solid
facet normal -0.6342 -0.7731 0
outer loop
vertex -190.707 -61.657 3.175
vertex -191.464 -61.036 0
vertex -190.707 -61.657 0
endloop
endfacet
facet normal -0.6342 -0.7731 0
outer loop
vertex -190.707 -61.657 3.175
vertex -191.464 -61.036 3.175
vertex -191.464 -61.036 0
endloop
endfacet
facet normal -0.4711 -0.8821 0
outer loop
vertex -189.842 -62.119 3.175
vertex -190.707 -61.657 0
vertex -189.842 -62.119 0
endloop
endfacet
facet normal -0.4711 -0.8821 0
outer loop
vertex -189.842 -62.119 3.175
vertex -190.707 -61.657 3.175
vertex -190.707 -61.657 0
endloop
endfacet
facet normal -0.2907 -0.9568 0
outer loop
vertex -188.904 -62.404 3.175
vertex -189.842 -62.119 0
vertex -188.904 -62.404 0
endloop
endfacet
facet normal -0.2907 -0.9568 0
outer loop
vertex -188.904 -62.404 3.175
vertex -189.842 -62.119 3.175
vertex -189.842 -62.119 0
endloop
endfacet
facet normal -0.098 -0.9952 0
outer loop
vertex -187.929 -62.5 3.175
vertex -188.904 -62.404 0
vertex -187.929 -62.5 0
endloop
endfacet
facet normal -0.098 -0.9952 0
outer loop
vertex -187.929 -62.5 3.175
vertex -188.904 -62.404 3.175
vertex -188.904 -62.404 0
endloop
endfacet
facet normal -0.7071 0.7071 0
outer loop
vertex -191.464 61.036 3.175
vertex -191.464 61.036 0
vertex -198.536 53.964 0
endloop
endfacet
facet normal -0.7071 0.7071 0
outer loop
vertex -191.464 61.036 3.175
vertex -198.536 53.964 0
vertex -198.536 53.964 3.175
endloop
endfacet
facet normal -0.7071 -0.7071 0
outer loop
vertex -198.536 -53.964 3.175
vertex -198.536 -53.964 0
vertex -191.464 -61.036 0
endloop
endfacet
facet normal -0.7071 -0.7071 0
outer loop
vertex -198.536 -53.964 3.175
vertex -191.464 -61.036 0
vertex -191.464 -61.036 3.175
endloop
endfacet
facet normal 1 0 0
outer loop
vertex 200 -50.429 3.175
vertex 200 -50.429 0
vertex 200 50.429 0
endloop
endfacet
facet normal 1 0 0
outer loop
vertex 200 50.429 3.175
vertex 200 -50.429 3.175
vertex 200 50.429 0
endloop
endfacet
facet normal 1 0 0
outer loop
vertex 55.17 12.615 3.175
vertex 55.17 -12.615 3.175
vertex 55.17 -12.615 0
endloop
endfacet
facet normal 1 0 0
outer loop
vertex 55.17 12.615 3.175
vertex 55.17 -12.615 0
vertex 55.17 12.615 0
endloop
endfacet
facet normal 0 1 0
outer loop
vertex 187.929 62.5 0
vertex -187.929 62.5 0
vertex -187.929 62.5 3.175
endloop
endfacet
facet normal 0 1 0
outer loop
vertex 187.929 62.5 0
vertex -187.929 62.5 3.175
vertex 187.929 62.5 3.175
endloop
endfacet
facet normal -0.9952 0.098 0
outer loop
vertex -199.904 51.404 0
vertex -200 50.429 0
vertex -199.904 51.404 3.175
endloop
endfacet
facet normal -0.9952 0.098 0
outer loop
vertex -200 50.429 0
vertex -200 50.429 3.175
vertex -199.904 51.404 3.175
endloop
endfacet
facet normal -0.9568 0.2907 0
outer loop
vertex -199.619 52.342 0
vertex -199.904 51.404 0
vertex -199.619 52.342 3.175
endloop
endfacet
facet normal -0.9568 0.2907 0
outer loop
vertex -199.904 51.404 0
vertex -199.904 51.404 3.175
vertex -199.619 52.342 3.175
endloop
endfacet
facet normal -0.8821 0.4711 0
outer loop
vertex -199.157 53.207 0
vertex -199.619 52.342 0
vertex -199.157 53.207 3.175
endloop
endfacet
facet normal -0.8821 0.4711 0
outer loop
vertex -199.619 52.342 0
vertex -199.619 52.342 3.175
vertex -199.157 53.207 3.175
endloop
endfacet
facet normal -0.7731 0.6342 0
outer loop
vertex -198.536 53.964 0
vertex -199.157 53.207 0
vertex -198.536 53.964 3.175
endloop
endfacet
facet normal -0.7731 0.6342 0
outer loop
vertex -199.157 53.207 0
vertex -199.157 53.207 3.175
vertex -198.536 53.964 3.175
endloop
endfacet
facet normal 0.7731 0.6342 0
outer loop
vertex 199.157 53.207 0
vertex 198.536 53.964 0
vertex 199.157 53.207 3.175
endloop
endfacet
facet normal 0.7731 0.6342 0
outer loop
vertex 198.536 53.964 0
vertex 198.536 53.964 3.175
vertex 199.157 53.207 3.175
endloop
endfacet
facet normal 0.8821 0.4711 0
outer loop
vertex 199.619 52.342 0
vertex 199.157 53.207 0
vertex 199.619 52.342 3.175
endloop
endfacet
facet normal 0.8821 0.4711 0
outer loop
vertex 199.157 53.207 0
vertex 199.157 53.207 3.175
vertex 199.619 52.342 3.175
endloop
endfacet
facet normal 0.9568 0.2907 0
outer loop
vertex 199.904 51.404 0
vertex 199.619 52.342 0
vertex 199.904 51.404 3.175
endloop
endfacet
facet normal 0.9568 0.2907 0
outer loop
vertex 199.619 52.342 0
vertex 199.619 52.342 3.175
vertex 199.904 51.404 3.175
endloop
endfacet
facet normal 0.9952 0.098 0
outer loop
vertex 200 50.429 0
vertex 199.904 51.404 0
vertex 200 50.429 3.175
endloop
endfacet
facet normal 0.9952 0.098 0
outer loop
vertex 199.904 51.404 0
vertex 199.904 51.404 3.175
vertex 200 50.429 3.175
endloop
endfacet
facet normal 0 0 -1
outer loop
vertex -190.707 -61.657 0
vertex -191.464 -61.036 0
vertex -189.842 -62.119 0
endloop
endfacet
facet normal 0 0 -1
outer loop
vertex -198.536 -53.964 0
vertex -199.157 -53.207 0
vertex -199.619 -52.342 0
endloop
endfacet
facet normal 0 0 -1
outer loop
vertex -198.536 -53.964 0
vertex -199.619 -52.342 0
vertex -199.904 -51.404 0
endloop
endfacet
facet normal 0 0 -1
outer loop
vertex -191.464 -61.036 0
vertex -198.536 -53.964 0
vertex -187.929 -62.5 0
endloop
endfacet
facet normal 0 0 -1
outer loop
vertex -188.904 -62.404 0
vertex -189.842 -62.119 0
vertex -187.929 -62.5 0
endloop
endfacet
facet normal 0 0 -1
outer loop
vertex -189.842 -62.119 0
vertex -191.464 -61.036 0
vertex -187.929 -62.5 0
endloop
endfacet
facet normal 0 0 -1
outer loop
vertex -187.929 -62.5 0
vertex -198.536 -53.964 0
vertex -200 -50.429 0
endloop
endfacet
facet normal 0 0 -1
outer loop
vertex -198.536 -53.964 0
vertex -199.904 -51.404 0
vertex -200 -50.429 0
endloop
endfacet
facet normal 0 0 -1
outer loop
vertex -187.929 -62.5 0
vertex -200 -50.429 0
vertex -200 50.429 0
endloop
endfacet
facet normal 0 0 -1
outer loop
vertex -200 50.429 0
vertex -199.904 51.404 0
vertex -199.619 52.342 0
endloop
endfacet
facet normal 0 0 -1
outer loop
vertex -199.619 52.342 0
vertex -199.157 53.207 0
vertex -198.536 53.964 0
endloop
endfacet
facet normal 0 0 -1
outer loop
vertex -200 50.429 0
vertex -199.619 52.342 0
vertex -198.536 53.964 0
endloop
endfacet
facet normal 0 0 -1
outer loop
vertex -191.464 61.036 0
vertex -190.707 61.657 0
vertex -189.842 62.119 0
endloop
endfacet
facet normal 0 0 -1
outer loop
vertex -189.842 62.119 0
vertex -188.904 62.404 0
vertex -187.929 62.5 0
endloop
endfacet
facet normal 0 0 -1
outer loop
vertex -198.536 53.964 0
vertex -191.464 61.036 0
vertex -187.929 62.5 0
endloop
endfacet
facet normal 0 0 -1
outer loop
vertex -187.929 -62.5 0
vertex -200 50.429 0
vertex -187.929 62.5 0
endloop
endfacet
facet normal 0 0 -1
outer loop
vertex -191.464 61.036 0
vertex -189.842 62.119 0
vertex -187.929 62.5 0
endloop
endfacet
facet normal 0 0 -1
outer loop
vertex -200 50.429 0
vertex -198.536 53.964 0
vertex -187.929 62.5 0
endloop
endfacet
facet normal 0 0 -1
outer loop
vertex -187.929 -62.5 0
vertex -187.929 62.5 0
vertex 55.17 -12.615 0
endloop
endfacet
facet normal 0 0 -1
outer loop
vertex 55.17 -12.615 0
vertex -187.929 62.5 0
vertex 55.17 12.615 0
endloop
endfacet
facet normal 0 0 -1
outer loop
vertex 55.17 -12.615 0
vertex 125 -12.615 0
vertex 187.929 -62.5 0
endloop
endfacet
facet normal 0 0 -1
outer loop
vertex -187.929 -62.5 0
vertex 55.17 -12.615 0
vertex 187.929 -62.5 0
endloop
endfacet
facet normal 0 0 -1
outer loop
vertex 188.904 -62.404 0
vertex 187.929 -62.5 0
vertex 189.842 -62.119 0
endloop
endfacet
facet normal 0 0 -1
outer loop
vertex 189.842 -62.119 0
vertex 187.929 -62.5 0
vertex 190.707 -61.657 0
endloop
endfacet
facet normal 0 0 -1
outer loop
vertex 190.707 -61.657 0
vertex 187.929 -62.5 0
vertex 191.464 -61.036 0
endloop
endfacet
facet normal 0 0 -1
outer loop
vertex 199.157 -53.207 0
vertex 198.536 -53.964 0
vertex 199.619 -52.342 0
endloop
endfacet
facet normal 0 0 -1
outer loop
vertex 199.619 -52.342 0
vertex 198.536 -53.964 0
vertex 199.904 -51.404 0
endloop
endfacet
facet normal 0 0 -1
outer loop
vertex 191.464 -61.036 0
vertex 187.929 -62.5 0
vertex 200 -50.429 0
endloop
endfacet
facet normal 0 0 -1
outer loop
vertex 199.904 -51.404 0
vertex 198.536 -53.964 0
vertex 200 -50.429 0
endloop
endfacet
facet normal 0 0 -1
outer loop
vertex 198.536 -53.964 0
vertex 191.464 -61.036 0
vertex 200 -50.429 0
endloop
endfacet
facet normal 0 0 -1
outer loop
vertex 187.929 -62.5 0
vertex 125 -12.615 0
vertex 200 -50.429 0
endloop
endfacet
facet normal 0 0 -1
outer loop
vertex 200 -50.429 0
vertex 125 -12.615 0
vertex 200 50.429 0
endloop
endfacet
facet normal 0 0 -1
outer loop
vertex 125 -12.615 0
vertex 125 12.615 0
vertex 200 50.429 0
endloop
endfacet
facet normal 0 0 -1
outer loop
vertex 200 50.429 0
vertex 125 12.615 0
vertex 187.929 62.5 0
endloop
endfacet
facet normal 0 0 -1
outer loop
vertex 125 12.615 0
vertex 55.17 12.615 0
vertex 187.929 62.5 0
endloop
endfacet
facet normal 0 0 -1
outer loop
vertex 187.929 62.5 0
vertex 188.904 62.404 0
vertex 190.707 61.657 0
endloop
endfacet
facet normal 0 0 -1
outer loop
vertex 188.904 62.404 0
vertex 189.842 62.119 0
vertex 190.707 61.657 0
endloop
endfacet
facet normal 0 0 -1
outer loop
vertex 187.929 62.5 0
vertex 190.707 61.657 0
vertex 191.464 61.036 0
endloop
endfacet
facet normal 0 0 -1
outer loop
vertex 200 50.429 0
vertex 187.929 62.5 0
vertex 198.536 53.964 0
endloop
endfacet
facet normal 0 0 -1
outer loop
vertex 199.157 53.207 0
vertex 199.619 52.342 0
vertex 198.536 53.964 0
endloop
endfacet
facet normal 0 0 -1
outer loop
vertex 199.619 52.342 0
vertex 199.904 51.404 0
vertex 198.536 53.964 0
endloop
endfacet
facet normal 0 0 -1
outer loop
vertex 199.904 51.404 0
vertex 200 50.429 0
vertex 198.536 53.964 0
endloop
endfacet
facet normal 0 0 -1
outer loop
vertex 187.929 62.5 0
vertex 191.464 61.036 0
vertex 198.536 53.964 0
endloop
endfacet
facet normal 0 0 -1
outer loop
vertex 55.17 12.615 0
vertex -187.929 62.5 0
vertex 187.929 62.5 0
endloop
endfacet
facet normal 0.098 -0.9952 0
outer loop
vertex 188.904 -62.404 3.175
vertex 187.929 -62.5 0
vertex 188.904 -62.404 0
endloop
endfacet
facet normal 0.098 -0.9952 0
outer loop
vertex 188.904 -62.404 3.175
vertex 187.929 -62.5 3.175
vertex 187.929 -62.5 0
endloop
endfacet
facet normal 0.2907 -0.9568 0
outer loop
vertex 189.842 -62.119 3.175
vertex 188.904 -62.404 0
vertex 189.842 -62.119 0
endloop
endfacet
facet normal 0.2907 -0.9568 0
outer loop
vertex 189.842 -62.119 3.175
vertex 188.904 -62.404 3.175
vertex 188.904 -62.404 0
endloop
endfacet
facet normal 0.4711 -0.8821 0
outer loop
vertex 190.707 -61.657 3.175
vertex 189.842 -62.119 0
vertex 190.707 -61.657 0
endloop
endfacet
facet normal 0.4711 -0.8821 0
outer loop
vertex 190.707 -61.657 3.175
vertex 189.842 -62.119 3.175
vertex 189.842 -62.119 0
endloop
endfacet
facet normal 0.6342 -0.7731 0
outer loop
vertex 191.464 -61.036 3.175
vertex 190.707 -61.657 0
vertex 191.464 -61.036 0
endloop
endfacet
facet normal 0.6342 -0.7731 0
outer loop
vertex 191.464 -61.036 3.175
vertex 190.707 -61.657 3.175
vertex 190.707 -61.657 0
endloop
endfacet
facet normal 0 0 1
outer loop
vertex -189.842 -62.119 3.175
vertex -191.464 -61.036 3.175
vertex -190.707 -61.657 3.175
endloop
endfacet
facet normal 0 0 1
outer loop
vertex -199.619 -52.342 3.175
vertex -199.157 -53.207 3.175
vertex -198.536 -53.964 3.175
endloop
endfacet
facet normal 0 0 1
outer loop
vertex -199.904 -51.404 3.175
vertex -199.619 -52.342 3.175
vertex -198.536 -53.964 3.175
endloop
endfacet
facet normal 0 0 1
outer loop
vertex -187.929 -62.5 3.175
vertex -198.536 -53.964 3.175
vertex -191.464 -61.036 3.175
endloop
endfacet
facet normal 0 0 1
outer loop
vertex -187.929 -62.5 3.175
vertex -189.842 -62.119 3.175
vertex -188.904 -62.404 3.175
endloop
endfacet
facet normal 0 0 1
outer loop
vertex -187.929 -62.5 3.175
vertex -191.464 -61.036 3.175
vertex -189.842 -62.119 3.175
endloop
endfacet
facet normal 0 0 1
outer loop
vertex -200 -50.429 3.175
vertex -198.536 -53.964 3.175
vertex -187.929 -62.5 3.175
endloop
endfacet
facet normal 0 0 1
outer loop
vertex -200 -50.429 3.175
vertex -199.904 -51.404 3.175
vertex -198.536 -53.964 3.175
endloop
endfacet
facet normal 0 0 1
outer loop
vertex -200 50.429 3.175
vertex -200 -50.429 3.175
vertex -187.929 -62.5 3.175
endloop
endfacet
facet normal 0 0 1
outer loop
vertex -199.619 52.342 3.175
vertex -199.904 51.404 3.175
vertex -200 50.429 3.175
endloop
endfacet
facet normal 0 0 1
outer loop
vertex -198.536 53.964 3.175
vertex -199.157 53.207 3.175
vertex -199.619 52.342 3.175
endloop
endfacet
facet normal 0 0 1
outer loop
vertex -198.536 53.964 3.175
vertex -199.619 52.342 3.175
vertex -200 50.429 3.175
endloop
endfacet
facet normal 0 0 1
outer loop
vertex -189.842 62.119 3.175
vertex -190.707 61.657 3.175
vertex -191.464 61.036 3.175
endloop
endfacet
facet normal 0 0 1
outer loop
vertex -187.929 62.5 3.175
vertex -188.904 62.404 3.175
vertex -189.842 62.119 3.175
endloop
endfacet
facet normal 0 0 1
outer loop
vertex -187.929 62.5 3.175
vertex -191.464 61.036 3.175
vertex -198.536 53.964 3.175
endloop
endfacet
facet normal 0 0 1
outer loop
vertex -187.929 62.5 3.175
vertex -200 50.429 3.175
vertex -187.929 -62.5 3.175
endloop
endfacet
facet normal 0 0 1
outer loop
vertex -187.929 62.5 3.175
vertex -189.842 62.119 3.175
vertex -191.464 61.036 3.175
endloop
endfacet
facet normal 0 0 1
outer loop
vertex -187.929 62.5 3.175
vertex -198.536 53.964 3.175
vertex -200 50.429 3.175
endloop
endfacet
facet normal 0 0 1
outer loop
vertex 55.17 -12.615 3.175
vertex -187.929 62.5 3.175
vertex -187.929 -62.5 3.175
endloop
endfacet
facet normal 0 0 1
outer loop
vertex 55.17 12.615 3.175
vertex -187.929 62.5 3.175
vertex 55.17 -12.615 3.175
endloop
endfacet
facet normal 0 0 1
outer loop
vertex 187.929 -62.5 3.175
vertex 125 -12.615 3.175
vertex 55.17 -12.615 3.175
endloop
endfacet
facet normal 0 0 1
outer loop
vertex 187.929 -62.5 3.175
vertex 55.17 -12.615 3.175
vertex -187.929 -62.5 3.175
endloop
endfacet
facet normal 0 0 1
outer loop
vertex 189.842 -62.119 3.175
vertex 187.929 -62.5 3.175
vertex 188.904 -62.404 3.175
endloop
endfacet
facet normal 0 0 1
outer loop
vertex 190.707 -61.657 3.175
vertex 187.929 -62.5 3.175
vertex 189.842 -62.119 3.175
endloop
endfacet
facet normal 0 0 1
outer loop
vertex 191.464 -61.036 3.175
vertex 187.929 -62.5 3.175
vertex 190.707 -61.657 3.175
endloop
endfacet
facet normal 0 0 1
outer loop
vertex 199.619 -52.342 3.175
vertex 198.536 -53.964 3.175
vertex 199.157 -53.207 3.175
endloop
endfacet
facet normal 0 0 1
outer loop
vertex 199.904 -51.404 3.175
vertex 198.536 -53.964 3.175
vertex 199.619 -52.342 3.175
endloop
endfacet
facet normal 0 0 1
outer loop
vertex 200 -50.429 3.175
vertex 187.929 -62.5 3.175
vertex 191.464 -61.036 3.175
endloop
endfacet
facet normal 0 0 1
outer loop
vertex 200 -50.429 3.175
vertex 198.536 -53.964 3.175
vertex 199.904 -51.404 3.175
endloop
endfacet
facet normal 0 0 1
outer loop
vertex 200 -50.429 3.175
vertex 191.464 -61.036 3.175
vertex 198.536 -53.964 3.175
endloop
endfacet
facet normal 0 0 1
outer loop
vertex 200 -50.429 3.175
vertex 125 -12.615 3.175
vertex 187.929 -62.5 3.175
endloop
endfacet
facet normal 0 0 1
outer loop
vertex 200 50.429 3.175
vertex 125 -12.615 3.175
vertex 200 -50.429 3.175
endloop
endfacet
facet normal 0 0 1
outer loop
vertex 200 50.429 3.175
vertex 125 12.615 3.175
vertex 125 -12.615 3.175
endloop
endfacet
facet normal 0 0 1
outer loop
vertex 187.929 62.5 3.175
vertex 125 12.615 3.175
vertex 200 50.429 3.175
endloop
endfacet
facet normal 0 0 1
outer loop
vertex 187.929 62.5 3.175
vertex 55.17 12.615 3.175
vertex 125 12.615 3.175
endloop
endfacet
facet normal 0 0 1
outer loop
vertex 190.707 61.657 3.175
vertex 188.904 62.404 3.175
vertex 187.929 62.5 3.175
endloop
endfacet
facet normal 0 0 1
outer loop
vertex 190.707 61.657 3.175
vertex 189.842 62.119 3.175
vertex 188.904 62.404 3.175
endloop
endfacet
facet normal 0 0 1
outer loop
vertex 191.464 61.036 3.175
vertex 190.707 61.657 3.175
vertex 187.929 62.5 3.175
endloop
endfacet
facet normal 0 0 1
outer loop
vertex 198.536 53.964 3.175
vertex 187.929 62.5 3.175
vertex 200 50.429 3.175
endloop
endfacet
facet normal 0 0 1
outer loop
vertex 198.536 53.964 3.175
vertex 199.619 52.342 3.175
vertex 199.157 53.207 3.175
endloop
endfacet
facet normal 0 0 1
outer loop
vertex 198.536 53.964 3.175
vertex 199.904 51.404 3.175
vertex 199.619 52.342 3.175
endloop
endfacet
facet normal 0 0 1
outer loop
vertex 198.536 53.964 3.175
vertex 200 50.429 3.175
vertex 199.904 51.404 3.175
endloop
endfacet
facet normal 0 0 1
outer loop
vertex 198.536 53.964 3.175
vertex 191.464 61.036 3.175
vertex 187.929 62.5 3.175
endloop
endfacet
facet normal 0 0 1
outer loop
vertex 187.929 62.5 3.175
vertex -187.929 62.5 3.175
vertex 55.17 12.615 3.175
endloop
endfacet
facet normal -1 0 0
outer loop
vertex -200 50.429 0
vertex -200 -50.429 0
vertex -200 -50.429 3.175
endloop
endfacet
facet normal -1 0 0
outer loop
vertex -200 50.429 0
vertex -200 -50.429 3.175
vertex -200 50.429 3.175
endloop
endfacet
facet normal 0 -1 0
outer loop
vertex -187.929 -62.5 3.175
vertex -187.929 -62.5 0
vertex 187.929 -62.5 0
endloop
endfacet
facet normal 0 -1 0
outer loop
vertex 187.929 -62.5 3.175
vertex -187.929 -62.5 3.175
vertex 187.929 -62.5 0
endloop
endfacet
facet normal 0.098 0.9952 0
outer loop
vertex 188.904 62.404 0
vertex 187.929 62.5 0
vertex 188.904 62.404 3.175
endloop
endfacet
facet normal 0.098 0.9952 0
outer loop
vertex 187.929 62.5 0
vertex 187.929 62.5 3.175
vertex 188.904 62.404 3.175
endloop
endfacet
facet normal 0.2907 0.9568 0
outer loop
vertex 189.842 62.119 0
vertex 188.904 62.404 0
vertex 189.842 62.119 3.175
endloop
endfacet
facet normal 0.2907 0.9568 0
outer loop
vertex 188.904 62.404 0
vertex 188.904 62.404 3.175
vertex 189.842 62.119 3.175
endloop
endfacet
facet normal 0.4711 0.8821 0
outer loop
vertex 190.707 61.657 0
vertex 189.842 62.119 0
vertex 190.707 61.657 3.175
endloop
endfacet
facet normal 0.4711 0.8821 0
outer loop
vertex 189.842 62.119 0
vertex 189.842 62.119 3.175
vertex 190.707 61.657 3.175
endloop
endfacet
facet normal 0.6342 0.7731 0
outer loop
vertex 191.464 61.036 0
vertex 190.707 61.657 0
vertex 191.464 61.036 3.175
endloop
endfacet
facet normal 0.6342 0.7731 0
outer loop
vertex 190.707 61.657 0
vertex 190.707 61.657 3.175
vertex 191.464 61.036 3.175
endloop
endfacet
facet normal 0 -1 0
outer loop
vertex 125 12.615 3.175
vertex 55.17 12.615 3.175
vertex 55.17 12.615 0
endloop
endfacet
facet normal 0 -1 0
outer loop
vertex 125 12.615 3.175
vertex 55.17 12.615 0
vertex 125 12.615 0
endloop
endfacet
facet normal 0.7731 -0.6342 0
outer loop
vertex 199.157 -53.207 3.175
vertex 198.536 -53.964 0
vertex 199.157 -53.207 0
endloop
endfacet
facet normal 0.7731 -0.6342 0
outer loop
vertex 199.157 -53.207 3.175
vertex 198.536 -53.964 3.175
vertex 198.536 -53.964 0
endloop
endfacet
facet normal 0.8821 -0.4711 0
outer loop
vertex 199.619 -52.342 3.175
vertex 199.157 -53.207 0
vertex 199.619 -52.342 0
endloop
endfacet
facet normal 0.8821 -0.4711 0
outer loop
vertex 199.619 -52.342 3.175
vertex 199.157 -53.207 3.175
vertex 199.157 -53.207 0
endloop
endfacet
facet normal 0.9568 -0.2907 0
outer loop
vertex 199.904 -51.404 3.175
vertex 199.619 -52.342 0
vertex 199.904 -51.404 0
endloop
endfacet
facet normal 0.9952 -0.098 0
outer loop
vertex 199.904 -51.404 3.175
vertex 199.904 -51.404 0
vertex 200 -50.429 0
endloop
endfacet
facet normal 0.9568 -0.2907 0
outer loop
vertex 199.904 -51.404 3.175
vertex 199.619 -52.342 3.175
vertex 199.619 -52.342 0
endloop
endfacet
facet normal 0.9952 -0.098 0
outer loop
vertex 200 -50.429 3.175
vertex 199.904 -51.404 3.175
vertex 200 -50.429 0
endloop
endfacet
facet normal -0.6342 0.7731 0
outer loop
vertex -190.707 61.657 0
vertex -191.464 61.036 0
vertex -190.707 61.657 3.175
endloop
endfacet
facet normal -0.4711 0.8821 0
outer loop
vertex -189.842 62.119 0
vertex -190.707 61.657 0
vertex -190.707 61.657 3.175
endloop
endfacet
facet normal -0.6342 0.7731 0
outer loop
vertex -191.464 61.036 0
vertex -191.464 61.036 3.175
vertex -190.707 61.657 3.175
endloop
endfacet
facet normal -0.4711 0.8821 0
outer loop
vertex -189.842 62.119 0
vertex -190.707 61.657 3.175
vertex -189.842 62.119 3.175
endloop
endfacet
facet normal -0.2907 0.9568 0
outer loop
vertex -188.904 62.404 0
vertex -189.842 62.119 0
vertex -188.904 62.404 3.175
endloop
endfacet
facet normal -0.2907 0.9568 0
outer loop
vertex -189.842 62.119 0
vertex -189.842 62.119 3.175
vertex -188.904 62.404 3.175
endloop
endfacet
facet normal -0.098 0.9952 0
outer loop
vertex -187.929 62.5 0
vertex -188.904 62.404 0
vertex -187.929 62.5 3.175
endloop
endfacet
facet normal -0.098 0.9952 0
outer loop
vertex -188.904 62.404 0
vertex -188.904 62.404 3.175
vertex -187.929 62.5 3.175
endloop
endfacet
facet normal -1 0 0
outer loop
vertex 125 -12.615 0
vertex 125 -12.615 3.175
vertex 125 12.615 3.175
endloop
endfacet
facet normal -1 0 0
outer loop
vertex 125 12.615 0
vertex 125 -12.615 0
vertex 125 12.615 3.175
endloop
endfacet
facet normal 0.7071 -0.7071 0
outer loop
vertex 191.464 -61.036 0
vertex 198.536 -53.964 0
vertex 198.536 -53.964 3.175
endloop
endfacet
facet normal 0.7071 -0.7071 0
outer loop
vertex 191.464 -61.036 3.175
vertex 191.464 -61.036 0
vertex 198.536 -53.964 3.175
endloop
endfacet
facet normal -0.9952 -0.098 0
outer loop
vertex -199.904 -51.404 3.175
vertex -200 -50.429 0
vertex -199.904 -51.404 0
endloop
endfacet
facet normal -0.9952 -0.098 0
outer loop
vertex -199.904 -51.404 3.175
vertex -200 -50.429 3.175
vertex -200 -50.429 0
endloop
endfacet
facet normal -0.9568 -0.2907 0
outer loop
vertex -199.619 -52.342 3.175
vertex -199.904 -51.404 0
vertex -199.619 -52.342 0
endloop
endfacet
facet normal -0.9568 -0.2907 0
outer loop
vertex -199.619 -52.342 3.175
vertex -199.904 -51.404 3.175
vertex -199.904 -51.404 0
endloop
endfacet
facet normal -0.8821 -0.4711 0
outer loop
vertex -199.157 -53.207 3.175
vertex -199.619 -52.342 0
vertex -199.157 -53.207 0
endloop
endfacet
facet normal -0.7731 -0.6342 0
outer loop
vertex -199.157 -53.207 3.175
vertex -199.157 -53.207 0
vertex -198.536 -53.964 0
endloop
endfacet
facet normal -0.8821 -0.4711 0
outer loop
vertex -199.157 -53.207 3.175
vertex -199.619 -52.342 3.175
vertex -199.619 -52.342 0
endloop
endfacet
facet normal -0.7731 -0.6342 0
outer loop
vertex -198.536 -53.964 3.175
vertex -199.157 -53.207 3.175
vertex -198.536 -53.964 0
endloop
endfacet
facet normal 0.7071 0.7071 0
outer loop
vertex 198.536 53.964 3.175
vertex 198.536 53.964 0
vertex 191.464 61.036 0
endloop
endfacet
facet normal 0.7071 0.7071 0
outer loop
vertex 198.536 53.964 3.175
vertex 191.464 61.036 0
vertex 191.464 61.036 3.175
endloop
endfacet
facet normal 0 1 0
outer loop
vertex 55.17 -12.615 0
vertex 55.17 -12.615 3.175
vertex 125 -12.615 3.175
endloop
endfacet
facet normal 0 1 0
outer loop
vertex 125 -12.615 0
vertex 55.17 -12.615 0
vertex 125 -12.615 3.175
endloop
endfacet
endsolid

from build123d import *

# Parameters (mm, degrees)
SKETCH1_W           = 400
SKETCH1_H           = 125
BOSS_EXTRUDE1_DEPTH = 3.175
SKETCH2_W           = 69.83
SKETCH2_H           = 25.23
CUT_EXTRUDE1_DEPTH  = 3.175
CHAMFER1_SIZE       = 10
FILLET1_R           = 5


with BuildPart() as part:
    # Sketch1 → Boss-Extrude1 (new body)
    with BuildSketch(Plane.XY):
        Rectangle(SKETCH1_W, SKETCH1_H)
    extrude(amount=BOSS_EXTRUDE1_DEPTH)

    # Sketch2 → Cut-Extrude1 (cut)
    with BuildSketch(Plane.XY.offset(3.175)):
        with Locations((90.085, 0)):
            Rectangle(SKETCH2_W, SKETCH2_H)
    extrude(amount=-CUT_EXTRUDE1_DEPTH, mode=Mode.SUBTRACT)

    # Chamfer1
    chamfer1_edges = [part.edges().sort_by_distance(p)[0] for p in [
        (200, -62.5, 1.5875),
        (-200, -62.5, 1.5875),
        (-200, 62.5, 1.5875),
        (200, 62.5, 1.5875),
    ]]
    chamfer(chamfer1_edges, length=CHAMFER1_SIZE)

    # Fillet1
    fillet1_edges = [part.edges().sort_by_distance(p)[0] for p in [
        (200, 52.5, 1.5875),
        (200, -52.5, 1.5875),
        (-190, -62.5, 1.5875),
        (190, -62.5, 1.5875),
        (-190, 62.5, 1.5875),
        (190, 62.5, 1.5875),
        (-200, -52.5, 1.5875),
        (-200, 52.5, 1.5875),
    ]]
    fillet(fillet1_edges, radius=FILLET1_R)


solid = part.part
